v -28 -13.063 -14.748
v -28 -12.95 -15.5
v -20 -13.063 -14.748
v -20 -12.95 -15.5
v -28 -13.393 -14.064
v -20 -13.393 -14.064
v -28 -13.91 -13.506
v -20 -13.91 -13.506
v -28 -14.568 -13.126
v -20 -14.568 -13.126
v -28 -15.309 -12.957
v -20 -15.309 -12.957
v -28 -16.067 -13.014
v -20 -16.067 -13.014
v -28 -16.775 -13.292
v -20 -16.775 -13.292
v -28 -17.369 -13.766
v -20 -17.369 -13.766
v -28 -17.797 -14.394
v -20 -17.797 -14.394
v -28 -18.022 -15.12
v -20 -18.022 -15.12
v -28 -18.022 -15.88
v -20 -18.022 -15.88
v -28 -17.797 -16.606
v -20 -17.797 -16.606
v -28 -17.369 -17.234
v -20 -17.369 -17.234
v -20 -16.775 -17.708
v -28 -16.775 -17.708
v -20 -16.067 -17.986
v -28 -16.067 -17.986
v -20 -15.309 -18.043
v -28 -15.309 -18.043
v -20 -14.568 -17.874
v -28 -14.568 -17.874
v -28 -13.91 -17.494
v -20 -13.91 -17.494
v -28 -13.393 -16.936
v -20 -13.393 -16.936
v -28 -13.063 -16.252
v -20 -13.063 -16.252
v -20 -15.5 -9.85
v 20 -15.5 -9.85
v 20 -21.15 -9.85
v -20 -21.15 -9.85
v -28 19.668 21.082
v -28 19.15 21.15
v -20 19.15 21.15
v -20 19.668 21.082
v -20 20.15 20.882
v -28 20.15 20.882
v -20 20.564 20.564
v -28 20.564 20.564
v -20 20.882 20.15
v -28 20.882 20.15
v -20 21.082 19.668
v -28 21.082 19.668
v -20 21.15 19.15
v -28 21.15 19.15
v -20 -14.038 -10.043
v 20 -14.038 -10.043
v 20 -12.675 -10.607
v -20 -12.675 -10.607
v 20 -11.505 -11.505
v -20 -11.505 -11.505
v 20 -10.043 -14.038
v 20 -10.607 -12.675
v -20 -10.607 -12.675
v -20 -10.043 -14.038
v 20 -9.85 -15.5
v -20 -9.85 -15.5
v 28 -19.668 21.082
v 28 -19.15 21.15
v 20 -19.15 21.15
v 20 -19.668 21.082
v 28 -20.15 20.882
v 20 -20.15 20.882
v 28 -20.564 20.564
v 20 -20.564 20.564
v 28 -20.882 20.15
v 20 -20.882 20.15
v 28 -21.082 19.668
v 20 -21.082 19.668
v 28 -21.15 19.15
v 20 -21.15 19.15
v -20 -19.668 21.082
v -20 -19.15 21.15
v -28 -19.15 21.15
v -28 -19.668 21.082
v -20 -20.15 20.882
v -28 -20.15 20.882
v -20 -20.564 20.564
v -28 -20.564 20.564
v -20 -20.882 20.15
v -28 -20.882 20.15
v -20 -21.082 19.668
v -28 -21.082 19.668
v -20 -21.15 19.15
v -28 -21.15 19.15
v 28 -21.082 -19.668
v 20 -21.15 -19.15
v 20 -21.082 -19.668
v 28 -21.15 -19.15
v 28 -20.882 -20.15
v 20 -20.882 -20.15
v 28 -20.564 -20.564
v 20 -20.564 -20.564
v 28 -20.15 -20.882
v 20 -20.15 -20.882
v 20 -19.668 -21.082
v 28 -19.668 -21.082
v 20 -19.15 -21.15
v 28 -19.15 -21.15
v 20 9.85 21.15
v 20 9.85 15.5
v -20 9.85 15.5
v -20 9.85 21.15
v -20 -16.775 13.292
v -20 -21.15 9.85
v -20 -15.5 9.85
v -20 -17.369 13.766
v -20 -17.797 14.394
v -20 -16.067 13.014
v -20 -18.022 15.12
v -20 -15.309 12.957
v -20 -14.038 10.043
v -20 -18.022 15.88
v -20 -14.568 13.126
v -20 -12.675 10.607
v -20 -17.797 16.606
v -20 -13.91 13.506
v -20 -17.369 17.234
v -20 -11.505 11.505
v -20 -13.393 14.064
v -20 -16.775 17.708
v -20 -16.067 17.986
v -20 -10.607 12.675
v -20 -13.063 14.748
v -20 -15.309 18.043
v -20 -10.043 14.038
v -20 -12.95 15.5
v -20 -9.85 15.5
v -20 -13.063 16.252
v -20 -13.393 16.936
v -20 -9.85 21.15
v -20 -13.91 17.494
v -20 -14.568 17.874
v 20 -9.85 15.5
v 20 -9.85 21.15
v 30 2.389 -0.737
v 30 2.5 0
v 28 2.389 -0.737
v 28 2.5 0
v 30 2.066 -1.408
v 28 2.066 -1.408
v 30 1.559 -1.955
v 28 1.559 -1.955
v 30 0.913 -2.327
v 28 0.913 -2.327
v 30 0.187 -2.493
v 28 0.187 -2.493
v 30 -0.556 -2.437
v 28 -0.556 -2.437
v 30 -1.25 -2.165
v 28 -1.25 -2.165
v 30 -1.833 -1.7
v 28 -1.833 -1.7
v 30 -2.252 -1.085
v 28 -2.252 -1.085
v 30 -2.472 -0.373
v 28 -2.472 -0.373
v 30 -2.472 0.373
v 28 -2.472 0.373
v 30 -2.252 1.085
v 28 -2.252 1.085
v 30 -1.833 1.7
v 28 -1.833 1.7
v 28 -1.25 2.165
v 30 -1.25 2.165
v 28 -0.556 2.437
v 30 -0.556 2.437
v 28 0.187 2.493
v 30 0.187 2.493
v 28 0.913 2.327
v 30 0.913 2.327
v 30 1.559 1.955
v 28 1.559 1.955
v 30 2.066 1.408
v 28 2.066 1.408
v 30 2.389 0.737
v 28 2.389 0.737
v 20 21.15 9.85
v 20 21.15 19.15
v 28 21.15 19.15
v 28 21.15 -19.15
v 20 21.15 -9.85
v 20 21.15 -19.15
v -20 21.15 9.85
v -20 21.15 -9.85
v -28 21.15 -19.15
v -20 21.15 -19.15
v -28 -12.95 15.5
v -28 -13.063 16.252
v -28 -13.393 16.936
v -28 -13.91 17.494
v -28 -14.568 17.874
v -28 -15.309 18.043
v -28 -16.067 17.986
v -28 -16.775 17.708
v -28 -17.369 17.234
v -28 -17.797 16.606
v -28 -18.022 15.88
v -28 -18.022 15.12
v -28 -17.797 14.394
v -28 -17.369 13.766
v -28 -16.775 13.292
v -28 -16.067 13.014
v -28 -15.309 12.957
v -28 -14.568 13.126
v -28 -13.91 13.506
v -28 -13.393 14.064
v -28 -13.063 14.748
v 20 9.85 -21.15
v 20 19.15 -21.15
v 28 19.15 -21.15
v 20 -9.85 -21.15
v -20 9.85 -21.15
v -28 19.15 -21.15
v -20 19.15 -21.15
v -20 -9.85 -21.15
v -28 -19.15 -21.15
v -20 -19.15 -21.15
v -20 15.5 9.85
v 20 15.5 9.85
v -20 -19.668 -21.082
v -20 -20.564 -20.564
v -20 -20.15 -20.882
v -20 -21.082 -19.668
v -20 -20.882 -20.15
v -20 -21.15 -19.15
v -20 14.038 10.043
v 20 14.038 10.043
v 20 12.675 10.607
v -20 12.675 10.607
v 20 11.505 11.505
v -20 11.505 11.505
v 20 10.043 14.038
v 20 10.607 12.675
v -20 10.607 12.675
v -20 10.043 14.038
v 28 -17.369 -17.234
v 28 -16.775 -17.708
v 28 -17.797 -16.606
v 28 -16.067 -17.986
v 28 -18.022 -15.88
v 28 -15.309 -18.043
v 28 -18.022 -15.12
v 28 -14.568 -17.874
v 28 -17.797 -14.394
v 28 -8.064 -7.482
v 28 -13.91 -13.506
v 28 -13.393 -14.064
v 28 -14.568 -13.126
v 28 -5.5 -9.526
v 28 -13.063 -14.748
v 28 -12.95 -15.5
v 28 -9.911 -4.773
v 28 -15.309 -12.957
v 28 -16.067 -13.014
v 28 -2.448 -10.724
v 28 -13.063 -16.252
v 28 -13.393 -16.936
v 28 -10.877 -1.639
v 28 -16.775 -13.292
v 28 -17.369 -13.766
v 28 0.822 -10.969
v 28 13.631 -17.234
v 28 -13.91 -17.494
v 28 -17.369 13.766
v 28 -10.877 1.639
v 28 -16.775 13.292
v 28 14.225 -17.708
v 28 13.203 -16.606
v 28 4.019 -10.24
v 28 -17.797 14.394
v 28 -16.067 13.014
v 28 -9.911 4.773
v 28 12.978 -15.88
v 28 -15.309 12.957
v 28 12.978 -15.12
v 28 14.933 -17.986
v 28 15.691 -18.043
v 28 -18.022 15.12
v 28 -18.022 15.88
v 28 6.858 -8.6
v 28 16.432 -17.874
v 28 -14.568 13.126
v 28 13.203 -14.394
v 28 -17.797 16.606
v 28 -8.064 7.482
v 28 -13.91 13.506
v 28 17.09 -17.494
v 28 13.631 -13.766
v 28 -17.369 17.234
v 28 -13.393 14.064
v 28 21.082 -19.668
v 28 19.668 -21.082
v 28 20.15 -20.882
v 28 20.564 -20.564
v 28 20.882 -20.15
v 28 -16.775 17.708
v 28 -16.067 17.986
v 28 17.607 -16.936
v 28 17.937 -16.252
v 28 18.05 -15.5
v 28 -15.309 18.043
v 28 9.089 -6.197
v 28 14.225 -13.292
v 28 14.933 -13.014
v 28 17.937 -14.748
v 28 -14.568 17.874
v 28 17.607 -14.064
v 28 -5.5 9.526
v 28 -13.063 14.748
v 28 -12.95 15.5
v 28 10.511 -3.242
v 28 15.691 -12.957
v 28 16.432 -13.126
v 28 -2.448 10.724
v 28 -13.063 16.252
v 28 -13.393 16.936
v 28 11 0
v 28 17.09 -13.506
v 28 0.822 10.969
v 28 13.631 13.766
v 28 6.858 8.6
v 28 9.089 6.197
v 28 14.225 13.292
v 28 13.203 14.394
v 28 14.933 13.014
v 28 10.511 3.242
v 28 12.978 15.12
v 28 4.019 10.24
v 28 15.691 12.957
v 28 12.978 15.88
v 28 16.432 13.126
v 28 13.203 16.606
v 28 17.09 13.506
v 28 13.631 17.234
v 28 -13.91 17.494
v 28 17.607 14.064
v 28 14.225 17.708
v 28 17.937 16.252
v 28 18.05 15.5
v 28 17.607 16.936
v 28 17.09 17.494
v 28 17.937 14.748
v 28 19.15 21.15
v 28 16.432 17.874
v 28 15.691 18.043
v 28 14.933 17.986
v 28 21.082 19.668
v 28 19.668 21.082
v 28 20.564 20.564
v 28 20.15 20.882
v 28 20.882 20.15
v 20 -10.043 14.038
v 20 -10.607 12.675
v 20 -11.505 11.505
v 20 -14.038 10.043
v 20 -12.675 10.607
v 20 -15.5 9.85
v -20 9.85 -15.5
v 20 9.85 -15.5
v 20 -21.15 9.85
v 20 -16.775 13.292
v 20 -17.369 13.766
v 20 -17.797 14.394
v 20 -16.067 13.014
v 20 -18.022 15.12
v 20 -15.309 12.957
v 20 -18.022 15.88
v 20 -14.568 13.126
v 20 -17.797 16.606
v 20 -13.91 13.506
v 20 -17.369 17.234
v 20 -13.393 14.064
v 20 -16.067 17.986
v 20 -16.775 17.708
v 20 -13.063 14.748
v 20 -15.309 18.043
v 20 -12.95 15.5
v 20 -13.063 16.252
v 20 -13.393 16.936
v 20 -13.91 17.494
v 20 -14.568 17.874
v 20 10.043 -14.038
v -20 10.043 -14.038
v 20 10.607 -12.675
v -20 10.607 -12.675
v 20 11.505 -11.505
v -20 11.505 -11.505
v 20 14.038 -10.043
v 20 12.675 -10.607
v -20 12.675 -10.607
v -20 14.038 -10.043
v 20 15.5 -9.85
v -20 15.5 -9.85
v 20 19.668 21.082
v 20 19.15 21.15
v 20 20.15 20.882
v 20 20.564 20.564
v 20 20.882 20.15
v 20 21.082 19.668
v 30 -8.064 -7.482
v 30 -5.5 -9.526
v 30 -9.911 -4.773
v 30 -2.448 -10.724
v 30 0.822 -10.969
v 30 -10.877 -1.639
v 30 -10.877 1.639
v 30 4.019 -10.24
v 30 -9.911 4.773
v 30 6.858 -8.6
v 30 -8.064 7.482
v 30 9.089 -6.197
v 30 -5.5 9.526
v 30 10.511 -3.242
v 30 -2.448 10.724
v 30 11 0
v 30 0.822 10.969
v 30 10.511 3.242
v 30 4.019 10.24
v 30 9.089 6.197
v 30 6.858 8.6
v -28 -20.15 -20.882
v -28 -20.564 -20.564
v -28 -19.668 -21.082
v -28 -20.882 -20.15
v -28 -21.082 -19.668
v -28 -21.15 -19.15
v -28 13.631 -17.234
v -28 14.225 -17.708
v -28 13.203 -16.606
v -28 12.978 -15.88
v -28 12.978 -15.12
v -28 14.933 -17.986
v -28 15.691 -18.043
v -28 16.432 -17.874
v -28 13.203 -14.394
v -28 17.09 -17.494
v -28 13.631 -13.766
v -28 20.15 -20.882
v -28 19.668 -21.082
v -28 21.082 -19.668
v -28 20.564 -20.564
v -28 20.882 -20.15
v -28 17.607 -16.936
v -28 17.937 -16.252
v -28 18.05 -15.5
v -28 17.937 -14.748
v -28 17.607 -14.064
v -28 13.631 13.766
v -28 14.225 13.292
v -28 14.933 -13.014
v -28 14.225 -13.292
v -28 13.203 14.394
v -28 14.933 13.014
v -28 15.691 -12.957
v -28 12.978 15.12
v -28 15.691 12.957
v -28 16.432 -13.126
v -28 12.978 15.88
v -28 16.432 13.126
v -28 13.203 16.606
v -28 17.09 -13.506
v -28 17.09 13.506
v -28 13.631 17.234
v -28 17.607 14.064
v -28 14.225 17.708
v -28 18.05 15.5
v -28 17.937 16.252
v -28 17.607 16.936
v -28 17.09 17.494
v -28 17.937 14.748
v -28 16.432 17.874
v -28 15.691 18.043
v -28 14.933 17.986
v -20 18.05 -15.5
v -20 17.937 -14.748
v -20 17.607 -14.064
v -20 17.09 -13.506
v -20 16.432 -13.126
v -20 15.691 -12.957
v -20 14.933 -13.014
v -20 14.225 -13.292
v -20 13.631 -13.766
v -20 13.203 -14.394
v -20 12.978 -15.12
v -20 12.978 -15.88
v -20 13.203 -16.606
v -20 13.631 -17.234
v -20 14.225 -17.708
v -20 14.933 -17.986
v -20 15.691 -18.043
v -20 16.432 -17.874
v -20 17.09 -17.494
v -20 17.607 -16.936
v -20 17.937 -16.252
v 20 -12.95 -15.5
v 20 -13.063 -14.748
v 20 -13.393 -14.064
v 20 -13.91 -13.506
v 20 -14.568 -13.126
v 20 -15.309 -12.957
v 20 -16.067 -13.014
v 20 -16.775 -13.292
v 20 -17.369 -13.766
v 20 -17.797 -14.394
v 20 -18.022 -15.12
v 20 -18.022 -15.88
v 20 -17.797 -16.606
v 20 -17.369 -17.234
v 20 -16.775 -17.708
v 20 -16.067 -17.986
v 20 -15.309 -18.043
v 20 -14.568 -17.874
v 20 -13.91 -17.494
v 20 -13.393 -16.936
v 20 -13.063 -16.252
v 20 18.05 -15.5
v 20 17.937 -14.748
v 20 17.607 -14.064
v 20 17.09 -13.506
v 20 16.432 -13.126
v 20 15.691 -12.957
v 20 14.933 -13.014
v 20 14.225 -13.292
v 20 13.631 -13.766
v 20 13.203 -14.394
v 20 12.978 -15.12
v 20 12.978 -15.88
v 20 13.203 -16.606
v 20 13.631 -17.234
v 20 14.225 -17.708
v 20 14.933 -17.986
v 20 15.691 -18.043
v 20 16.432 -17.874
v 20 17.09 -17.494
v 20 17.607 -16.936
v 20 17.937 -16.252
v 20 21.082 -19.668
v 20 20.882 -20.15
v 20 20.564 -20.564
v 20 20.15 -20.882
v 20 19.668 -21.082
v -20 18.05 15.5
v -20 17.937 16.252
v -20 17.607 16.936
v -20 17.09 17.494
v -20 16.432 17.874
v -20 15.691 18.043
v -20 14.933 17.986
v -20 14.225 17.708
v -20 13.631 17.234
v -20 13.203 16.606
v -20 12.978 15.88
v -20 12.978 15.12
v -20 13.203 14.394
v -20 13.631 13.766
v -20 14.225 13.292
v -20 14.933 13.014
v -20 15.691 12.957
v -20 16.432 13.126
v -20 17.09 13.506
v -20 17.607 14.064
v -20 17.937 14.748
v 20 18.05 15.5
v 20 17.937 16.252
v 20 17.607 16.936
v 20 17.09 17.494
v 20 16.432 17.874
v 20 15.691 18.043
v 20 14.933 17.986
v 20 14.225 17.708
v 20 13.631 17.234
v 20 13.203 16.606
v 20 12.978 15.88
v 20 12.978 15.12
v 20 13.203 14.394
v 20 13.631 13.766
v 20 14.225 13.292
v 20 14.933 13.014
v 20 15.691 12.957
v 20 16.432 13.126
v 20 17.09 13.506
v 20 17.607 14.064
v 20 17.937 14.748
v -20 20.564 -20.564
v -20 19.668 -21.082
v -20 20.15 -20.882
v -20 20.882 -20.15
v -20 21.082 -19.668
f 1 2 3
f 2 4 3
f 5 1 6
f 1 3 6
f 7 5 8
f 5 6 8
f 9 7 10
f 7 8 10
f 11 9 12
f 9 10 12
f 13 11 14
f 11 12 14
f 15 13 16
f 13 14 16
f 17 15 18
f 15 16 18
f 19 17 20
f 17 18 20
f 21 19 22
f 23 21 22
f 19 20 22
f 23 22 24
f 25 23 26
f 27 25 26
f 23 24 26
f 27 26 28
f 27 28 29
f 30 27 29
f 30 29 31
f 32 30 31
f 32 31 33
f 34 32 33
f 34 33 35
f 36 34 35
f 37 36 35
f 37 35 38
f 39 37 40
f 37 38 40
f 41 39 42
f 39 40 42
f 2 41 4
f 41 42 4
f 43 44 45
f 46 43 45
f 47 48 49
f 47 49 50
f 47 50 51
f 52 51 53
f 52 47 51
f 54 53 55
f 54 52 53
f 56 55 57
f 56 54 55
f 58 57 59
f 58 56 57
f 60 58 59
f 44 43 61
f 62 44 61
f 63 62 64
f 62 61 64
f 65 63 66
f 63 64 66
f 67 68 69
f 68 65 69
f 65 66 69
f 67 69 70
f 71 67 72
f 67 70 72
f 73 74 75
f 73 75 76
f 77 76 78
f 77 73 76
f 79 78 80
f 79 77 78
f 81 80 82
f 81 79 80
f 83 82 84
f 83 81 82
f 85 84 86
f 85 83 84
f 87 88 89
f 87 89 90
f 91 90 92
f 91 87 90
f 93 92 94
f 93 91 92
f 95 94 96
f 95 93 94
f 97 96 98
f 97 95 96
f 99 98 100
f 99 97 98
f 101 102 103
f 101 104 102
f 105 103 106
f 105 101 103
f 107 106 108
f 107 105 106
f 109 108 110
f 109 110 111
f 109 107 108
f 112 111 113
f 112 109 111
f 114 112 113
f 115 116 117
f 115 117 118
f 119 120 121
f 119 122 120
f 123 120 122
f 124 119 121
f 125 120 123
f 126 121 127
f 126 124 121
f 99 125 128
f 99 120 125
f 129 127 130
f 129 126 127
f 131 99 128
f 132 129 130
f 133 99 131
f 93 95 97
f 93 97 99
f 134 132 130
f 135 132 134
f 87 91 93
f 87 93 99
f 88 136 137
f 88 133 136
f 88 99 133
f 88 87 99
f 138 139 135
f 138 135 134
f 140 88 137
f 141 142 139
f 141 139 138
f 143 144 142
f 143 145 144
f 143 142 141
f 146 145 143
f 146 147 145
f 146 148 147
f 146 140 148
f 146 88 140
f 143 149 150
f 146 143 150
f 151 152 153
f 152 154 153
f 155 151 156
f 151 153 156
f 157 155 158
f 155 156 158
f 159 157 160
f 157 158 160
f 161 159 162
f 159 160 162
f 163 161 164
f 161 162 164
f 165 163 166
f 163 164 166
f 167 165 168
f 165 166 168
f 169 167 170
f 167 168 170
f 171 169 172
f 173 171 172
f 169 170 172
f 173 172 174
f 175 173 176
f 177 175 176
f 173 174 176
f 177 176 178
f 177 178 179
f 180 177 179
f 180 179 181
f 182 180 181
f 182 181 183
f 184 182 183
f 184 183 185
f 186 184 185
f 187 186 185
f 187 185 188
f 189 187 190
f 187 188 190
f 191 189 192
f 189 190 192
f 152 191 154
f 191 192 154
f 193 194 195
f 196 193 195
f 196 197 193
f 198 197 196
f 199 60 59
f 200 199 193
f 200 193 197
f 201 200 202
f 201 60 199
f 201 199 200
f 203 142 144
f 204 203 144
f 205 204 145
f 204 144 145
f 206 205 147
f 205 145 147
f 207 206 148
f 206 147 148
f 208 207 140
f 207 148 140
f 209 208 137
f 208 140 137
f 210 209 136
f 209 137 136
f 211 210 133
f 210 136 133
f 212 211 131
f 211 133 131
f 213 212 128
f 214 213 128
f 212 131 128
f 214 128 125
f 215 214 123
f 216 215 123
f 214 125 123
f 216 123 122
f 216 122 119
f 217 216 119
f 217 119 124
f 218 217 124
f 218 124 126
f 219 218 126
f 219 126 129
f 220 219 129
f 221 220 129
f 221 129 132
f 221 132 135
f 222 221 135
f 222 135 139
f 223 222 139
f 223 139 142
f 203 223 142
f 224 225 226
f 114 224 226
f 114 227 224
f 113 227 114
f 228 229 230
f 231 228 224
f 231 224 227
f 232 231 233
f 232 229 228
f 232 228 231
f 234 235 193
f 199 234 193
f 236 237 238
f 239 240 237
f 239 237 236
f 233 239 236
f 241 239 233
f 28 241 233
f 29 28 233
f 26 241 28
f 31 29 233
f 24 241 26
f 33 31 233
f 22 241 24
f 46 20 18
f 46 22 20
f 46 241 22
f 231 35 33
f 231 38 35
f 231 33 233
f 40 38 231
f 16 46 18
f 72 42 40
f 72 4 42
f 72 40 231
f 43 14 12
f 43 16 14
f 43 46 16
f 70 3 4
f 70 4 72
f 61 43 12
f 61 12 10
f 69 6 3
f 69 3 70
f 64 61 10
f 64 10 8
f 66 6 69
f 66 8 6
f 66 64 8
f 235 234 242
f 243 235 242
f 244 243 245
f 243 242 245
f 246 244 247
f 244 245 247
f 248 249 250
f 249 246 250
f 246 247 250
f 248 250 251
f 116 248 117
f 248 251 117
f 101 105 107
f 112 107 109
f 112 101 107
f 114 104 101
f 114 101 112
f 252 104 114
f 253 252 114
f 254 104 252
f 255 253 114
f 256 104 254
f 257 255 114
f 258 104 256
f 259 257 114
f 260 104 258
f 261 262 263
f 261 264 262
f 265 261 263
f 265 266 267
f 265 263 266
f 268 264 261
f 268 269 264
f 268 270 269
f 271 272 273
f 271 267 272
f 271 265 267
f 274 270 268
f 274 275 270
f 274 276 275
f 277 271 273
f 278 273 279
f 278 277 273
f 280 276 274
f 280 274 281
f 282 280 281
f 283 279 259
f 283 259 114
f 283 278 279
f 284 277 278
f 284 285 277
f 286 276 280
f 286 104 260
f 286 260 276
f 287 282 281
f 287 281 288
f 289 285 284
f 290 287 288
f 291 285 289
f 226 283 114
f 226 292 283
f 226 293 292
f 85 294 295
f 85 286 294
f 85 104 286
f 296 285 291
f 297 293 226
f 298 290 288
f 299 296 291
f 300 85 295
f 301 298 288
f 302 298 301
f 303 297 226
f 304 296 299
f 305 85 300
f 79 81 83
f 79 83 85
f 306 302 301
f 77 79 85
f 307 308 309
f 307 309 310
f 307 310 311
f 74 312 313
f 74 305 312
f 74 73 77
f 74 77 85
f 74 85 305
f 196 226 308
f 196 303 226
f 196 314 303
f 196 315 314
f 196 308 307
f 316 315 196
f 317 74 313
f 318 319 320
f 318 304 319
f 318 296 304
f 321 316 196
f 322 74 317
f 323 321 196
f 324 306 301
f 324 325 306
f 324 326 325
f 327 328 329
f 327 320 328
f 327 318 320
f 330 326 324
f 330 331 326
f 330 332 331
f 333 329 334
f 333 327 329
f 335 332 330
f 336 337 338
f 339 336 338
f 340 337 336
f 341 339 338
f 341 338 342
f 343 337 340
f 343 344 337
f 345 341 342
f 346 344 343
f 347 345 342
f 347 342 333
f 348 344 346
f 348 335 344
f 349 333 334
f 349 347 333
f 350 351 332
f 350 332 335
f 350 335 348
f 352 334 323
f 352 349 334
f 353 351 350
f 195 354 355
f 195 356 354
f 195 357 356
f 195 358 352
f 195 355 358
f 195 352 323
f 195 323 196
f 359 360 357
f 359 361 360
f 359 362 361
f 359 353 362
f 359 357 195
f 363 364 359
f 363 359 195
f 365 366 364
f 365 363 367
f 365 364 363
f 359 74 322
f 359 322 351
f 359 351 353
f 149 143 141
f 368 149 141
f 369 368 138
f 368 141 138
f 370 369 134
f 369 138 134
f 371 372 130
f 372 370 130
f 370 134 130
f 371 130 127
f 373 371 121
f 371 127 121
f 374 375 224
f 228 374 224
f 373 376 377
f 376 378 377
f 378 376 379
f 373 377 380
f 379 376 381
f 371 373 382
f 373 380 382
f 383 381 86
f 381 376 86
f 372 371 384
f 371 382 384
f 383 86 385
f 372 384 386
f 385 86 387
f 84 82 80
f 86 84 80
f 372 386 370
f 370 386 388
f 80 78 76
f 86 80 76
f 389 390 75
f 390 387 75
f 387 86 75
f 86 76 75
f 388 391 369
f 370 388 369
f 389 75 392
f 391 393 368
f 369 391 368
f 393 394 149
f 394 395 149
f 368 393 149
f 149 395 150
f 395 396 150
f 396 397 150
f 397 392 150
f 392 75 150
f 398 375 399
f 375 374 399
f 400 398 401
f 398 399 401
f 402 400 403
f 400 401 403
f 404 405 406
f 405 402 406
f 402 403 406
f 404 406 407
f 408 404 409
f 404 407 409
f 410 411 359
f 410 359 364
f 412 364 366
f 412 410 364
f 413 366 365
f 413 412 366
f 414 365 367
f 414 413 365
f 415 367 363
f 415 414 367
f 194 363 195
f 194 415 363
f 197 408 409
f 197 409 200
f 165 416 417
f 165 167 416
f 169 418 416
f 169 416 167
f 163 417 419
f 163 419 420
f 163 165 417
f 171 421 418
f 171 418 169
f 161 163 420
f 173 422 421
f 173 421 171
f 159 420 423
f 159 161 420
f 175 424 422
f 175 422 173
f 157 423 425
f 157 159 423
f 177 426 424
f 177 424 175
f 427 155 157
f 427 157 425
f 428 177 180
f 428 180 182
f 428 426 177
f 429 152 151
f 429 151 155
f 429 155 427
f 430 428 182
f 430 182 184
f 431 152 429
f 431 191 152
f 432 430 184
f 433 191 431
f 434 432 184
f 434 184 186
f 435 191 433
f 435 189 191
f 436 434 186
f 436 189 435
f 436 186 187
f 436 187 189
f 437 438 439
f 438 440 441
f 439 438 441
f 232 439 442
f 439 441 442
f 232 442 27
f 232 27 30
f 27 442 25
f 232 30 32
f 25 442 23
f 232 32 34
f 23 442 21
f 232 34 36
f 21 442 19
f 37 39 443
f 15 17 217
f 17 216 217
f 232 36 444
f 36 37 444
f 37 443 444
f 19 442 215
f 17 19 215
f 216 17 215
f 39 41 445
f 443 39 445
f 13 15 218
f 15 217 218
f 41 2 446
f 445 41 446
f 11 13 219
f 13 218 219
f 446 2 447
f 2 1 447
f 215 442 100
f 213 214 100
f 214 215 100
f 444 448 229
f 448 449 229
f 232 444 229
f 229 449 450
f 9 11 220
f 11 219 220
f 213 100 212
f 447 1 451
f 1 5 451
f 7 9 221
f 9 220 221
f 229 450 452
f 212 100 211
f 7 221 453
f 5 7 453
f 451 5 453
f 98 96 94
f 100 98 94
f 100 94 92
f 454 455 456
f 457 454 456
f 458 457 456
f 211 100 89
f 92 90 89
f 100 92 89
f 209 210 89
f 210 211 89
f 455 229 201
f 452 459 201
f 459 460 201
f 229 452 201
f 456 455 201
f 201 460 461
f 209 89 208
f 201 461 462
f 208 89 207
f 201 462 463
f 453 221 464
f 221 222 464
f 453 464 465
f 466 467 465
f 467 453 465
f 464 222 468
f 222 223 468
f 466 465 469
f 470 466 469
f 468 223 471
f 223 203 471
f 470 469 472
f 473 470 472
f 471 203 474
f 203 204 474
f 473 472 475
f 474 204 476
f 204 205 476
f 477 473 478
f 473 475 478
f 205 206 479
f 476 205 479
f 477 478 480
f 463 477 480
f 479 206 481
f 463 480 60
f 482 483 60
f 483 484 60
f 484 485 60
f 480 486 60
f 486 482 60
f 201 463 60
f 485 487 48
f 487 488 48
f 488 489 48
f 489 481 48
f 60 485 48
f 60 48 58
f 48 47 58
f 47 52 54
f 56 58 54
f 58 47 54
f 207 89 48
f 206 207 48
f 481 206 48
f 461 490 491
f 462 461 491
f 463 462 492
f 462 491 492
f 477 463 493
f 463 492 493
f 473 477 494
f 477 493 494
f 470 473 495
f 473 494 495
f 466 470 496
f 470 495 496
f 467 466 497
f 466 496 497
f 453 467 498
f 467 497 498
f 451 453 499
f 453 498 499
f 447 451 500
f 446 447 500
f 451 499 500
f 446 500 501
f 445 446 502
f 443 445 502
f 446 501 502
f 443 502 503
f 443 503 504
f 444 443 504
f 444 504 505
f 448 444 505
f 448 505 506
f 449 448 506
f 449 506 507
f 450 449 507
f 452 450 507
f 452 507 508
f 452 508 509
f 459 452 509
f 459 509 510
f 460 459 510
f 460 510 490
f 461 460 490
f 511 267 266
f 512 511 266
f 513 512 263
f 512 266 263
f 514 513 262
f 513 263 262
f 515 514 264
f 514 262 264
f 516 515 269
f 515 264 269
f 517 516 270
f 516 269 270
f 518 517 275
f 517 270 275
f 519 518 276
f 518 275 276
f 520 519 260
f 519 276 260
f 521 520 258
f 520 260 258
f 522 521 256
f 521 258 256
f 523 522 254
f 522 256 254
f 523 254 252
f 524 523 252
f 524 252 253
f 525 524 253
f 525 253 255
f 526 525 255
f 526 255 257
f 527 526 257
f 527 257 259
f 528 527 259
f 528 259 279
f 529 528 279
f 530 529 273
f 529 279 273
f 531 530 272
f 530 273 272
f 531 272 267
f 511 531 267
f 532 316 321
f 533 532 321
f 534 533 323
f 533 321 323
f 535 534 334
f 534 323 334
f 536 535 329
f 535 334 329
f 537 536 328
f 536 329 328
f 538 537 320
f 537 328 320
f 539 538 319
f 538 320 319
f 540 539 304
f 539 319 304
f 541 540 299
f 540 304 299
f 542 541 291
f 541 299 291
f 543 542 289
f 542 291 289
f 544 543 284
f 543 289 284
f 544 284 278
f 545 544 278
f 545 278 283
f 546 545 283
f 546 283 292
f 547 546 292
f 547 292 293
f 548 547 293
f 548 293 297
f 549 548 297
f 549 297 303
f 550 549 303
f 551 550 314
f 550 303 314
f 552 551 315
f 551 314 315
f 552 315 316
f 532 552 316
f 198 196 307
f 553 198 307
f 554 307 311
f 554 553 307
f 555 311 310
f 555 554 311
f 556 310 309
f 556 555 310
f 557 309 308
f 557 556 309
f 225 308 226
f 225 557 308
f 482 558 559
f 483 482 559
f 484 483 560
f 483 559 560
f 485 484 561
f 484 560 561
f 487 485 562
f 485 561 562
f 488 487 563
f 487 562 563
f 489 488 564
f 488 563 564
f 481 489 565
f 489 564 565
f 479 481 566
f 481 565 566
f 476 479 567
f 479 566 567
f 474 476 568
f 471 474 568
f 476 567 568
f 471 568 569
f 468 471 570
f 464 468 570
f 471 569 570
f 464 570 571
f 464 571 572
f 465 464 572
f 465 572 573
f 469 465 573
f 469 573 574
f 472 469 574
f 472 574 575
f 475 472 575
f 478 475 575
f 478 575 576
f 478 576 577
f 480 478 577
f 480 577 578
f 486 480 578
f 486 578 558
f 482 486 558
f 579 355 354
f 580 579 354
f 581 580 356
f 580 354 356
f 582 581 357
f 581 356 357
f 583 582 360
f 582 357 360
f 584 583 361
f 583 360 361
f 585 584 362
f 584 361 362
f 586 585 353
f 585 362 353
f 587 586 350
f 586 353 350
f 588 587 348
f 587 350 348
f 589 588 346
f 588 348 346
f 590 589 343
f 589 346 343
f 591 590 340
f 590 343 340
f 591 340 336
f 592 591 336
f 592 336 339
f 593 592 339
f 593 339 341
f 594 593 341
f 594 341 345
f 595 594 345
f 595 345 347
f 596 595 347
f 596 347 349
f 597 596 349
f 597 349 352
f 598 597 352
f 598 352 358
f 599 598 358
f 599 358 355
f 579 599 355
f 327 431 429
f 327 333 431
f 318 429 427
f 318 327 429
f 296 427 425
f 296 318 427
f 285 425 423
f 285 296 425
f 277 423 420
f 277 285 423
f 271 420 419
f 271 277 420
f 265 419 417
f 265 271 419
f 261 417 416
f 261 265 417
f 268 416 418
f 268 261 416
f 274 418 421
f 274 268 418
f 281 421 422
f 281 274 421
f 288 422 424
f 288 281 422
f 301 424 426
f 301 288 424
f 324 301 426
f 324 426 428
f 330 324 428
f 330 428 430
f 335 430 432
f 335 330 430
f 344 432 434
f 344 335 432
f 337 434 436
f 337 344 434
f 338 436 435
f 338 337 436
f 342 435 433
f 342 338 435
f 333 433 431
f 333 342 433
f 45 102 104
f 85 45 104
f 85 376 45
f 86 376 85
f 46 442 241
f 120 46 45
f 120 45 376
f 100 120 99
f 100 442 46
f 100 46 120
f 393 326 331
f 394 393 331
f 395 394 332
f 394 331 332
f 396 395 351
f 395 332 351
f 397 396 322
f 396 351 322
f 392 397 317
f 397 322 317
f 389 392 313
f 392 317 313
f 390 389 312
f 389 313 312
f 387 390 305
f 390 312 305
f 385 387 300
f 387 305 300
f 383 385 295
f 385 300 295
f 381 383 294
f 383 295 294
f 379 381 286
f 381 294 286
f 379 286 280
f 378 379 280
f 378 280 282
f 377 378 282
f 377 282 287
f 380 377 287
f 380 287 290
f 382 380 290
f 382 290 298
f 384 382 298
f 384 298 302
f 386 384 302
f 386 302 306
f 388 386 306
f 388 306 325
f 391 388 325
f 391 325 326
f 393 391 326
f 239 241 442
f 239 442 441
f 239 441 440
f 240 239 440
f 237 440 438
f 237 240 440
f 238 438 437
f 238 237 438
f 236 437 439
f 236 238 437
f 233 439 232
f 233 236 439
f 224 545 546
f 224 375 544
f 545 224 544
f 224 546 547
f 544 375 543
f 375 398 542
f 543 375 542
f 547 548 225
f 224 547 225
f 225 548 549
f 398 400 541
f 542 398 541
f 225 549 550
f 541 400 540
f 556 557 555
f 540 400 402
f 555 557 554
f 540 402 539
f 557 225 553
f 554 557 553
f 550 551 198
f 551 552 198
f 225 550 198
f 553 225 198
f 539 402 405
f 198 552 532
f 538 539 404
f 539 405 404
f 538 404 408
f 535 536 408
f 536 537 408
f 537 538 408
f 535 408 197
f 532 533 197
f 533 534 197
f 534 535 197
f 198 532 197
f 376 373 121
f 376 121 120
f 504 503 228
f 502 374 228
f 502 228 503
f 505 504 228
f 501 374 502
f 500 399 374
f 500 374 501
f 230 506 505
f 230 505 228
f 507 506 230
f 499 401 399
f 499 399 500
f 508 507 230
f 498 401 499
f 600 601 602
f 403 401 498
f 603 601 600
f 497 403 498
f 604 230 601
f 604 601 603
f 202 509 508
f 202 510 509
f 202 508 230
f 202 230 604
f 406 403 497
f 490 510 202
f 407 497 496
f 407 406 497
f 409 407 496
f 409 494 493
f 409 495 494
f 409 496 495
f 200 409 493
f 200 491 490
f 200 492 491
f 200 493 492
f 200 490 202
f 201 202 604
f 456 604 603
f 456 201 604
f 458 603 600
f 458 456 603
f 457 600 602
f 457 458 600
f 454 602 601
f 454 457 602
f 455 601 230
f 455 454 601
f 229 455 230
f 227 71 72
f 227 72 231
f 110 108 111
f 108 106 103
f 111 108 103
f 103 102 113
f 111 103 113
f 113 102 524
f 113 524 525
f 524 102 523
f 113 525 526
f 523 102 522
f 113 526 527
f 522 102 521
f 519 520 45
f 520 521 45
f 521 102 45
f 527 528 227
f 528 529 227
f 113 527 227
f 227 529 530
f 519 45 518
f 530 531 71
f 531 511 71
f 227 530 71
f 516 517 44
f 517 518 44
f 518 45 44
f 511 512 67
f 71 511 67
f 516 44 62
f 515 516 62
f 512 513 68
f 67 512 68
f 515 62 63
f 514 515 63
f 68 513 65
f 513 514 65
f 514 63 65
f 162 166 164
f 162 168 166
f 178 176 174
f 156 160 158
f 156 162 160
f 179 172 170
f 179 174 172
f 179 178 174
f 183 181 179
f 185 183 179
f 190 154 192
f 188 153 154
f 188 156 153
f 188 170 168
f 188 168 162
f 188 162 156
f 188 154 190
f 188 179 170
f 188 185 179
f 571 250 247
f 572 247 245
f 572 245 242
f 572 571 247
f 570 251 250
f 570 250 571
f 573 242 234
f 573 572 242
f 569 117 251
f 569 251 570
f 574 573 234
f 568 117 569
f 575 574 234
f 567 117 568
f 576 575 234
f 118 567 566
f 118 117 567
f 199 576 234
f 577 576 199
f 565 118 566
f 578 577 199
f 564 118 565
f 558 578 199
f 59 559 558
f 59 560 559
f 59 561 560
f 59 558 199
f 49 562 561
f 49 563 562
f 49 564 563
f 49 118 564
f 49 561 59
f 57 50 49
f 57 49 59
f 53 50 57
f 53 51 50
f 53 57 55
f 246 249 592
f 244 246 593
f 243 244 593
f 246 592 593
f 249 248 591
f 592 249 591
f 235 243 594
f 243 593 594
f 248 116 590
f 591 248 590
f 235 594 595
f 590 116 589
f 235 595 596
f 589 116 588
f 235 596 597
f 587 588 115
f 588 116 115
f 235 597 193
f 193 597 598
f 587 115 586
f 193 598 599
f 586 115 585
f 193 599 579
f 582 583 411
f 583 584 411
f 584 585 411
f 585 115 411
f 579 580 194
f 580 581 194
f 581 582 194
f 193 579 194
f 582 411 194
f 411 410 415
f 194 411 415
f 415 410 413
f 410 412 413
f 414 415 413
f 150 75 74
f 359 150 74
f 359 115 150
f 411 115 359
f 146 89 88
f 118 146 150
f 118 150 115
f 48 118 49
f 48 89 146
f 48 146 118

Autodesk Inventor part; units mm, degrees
ref_plane "XZ Plane" through (0, 0, 0) normal (0, 1, 0) x (-1, 0, 0)
ref_plane "XY Plane" through (0, 0, 0) normal (0, 0, 1) x (1, 0, 0)
sketch "Sketch1" plane through (0, 0, 0) normal (1, 0, 0) x (0, 1, 0)
  line L0 (-21.15, 21.15) -> (21.15, 21.15)
  line L1 (21.15, 21.15) -> (21.15, -21.15)
  line L2 (21.15, -21.15) -> (-21.15, -21.15)
  line L3 (-21.15, -21.15) -> (-21.15, 21.15)
  point P0 (0, 0)
  point P1 (0, 21.15)
  point P2 (21.15, 0)
  dimension "d0" = 42.3
  dimension "d1" = 42.3
extrude "Extrusion1" add sketch "Sketch1" along normal mid plane 56
ref_plane "Work Plane1" through (28, 0, 0) normal (1, 0, 0) x (0, 1, 0)
sketch "Sketch2" plane through (28, 0, 0) normal (1, 0, 0) x (0, 1, 0)
  circle A0 centre (0, 0) radius 11
  circle A1 centre (0, 0) radius 2.5
  circle A2 centre (15.5, 15.5) radius 2.55
  line L0 (21.15, -21.15) -> (21.15, 21.15) construction
  line L1 (21.15, 0) -> (0, 0) construction
  line L2 (0, 0) -> (0, 21.15) construction
  line L3 (21.15, 21.15) -> (-21.15, 21.15) construction
  circle A3 centre (15.5, -15.5) radius 2.55
  circle A4 centre (-15.5, 15.5) radius 2.55
  circle A5 centre (-15.5, -15.5) radius 2.55
  line L4 (1, 2.2913) -> (1, -2.2913)
  dimension "d5" = 22
  dimension "d6" = 5
  dimension "d15" = 5.1
  dimension "d16" = 31
  dimension "d17" = 31
  dimension "d20" = 1
extrude "Extrusion2" add sketch "Sketch2" along normal blind 2 contours A0
fillet "Fillet1" radius 2 1 edges at (0, 21.15, 21.15)
pattern_circular "Circular Pattern1" count 4 over 360 about axis through (28, 0, 0) along (1, 0, 0) of "Fillet1"
extrude "Extrusion4" cut sketch "Sketch2" against normal through all contours A2 | A3 | A4 | A5
sketch "Sketch3" plane through (0, 0, 0) normal (1, 0, 0) x (0, 1, 0)
  circle A0 centre (-15.5, 15.5) radius 2.55 construction
  circle A1 centre (15.5, 15.5) radius 2.55 construction
  circle A2 centre (-15.5, -15.5) radius 2.55 construction
  circle A3 centre (15.5, -15.5) radius 2.55 construction
  arc A4 (19.15, -21.15) -> (21.15, -19.15) centre (19.15, -19.15) ccw construction
  line L0 (21.15, -19.15) -> (21.15, 19.15) construction
  arc A5 (21.15, 19.15) -> (19.15, 21.15) centre (19.15, 19.15) ccw construction
  line L1 (19.15, 21.15) -> (-19.15, 21.15) construction
  arc A6 (-19.15, 21.15) -> (-21.15, 19.15) centre (-19.15, 19.15) ccw construction
  line L2 (-21.15, 19.15) -> (-21.15, -19.15) construction
  arc A7 (-21.15, -19.15) -> (-19.15, -21.15) centre (-19.15, -19.15) ccw construction
  line L3 (-19.15, -21.15) -> (19.15, -21.15) construction
  circle A8 centre (0, 0) radius 11 construction
  circle A9 centre (15.5, 15.5) radius 5.65 construction
  line L4 (-19.15, 21.15) -> (19.15, 21.15) construction
  line L5 (0, 21.15) -> (0, 0) construction
  line L6 (0, 0) -> (21.15, 0) construction
  line L7 (9.85, 15.5) -> (9.85, 21.15)
  line L8 (9.85, 21.15) -> (21.15, 21.15)
  line L9 (21.15, 21.15) -> (21.15, 9.85)
  line L10 (15.5, 9.85) -> (21.15, 9.85)
  arc A10 (9.85, 15.5) -> (15.5, 9.85) centre (15.5, 15.5) ccw
  circle A11 centre (15.5, -15.5) radius 2.55 construction
  arc A12 (19.15, -21.15) -> (21.15, -19.15) centre (19.15, -19.15) ccw construction
  circle A13 centre (0, 0) radius 11 construction
  circle A14 centre (15.5, -15.5) radius 5.65 construction
  line L11 (-19.15, -21.15) -> (19.15, -21.15) construction
  line L12 (9.85, -15.5) -> (9.85, -21.15)
  line L13 (9.85, -21.15) -> (21.15, -21.15)
  line L14 (21.15, -21.15) -> (21.15, -9.85)
  line L15 (15.5, -9.85) -> (21.15, -9.85)
  arc A15 (15.5, -9.85) -> (9.85, -15.5) centre (15.5, -15.5) ccw
  circle A16 centre (-15.5, 15.5) radius 2.55 construction
  circle A17 centre (-15.5, -15.5) radius 2.55 construction
  arc A18 (-21.15, -19.15) -> (-19.15, -21.15) centre (-19.15, -19.15) ccw construction
  arc A19 (-19.15, 21.15) -> (-21.15, 19.15) centre (-19.15, 19.15) ccw construction
  line L16 (19.15, -21.15) -> (-19.15, -21.15) construction
  circle A20 centre (-15.5, 15.5) radius 5.65 construction
  line L17 (-9.85, 15.5) -> (-9.85, 21.15)
  line L18 (-9.85, 21.15) -> (-21.15, 21.15)
  line L19 (-21.15, 21.15) -> (-21.15, 9.85)
  line L20 (-15.5, 9.85) -> (-21.15, 9.85)
  arc A21 (-15.5, 9.85) -> (-9.85, 15.5) centre (-15.5, 15.5) ccw
  circle A22 centre (-15.5, -15.5) radius 2.55 construction
  circle A23 centre (0, 0) radius 11 construction
  line L21 (-15.5, -9.85) -> (-21.15, -9.85)
  arc A24 (-9.85, -15.5) -> (-15.5, -9.85) centre (-15.5, -15.5) ccw
  line L22 (-9.85, -15.5) -> (-9.85, -21.15)
  line L23 (-21.15, -21.15) -> (-21.15, -9.85)
  line L24 (-9.85, -21.15) -> (-21.15, -21.15)
  arc A25 (-21.15, -19.15) -> (-19.15, -21.15) centre (-19.15, -19.15) ccw construction
  circle A26 centre (-15.5, -15.5) radius 5.65 construction
  point P0 (-21.15, 0)
  dimension "d25" = 11.3
extrude "Extrusion6" cut sketch "Sketch3" along normal mid plane 40
properties part number "stepper"
